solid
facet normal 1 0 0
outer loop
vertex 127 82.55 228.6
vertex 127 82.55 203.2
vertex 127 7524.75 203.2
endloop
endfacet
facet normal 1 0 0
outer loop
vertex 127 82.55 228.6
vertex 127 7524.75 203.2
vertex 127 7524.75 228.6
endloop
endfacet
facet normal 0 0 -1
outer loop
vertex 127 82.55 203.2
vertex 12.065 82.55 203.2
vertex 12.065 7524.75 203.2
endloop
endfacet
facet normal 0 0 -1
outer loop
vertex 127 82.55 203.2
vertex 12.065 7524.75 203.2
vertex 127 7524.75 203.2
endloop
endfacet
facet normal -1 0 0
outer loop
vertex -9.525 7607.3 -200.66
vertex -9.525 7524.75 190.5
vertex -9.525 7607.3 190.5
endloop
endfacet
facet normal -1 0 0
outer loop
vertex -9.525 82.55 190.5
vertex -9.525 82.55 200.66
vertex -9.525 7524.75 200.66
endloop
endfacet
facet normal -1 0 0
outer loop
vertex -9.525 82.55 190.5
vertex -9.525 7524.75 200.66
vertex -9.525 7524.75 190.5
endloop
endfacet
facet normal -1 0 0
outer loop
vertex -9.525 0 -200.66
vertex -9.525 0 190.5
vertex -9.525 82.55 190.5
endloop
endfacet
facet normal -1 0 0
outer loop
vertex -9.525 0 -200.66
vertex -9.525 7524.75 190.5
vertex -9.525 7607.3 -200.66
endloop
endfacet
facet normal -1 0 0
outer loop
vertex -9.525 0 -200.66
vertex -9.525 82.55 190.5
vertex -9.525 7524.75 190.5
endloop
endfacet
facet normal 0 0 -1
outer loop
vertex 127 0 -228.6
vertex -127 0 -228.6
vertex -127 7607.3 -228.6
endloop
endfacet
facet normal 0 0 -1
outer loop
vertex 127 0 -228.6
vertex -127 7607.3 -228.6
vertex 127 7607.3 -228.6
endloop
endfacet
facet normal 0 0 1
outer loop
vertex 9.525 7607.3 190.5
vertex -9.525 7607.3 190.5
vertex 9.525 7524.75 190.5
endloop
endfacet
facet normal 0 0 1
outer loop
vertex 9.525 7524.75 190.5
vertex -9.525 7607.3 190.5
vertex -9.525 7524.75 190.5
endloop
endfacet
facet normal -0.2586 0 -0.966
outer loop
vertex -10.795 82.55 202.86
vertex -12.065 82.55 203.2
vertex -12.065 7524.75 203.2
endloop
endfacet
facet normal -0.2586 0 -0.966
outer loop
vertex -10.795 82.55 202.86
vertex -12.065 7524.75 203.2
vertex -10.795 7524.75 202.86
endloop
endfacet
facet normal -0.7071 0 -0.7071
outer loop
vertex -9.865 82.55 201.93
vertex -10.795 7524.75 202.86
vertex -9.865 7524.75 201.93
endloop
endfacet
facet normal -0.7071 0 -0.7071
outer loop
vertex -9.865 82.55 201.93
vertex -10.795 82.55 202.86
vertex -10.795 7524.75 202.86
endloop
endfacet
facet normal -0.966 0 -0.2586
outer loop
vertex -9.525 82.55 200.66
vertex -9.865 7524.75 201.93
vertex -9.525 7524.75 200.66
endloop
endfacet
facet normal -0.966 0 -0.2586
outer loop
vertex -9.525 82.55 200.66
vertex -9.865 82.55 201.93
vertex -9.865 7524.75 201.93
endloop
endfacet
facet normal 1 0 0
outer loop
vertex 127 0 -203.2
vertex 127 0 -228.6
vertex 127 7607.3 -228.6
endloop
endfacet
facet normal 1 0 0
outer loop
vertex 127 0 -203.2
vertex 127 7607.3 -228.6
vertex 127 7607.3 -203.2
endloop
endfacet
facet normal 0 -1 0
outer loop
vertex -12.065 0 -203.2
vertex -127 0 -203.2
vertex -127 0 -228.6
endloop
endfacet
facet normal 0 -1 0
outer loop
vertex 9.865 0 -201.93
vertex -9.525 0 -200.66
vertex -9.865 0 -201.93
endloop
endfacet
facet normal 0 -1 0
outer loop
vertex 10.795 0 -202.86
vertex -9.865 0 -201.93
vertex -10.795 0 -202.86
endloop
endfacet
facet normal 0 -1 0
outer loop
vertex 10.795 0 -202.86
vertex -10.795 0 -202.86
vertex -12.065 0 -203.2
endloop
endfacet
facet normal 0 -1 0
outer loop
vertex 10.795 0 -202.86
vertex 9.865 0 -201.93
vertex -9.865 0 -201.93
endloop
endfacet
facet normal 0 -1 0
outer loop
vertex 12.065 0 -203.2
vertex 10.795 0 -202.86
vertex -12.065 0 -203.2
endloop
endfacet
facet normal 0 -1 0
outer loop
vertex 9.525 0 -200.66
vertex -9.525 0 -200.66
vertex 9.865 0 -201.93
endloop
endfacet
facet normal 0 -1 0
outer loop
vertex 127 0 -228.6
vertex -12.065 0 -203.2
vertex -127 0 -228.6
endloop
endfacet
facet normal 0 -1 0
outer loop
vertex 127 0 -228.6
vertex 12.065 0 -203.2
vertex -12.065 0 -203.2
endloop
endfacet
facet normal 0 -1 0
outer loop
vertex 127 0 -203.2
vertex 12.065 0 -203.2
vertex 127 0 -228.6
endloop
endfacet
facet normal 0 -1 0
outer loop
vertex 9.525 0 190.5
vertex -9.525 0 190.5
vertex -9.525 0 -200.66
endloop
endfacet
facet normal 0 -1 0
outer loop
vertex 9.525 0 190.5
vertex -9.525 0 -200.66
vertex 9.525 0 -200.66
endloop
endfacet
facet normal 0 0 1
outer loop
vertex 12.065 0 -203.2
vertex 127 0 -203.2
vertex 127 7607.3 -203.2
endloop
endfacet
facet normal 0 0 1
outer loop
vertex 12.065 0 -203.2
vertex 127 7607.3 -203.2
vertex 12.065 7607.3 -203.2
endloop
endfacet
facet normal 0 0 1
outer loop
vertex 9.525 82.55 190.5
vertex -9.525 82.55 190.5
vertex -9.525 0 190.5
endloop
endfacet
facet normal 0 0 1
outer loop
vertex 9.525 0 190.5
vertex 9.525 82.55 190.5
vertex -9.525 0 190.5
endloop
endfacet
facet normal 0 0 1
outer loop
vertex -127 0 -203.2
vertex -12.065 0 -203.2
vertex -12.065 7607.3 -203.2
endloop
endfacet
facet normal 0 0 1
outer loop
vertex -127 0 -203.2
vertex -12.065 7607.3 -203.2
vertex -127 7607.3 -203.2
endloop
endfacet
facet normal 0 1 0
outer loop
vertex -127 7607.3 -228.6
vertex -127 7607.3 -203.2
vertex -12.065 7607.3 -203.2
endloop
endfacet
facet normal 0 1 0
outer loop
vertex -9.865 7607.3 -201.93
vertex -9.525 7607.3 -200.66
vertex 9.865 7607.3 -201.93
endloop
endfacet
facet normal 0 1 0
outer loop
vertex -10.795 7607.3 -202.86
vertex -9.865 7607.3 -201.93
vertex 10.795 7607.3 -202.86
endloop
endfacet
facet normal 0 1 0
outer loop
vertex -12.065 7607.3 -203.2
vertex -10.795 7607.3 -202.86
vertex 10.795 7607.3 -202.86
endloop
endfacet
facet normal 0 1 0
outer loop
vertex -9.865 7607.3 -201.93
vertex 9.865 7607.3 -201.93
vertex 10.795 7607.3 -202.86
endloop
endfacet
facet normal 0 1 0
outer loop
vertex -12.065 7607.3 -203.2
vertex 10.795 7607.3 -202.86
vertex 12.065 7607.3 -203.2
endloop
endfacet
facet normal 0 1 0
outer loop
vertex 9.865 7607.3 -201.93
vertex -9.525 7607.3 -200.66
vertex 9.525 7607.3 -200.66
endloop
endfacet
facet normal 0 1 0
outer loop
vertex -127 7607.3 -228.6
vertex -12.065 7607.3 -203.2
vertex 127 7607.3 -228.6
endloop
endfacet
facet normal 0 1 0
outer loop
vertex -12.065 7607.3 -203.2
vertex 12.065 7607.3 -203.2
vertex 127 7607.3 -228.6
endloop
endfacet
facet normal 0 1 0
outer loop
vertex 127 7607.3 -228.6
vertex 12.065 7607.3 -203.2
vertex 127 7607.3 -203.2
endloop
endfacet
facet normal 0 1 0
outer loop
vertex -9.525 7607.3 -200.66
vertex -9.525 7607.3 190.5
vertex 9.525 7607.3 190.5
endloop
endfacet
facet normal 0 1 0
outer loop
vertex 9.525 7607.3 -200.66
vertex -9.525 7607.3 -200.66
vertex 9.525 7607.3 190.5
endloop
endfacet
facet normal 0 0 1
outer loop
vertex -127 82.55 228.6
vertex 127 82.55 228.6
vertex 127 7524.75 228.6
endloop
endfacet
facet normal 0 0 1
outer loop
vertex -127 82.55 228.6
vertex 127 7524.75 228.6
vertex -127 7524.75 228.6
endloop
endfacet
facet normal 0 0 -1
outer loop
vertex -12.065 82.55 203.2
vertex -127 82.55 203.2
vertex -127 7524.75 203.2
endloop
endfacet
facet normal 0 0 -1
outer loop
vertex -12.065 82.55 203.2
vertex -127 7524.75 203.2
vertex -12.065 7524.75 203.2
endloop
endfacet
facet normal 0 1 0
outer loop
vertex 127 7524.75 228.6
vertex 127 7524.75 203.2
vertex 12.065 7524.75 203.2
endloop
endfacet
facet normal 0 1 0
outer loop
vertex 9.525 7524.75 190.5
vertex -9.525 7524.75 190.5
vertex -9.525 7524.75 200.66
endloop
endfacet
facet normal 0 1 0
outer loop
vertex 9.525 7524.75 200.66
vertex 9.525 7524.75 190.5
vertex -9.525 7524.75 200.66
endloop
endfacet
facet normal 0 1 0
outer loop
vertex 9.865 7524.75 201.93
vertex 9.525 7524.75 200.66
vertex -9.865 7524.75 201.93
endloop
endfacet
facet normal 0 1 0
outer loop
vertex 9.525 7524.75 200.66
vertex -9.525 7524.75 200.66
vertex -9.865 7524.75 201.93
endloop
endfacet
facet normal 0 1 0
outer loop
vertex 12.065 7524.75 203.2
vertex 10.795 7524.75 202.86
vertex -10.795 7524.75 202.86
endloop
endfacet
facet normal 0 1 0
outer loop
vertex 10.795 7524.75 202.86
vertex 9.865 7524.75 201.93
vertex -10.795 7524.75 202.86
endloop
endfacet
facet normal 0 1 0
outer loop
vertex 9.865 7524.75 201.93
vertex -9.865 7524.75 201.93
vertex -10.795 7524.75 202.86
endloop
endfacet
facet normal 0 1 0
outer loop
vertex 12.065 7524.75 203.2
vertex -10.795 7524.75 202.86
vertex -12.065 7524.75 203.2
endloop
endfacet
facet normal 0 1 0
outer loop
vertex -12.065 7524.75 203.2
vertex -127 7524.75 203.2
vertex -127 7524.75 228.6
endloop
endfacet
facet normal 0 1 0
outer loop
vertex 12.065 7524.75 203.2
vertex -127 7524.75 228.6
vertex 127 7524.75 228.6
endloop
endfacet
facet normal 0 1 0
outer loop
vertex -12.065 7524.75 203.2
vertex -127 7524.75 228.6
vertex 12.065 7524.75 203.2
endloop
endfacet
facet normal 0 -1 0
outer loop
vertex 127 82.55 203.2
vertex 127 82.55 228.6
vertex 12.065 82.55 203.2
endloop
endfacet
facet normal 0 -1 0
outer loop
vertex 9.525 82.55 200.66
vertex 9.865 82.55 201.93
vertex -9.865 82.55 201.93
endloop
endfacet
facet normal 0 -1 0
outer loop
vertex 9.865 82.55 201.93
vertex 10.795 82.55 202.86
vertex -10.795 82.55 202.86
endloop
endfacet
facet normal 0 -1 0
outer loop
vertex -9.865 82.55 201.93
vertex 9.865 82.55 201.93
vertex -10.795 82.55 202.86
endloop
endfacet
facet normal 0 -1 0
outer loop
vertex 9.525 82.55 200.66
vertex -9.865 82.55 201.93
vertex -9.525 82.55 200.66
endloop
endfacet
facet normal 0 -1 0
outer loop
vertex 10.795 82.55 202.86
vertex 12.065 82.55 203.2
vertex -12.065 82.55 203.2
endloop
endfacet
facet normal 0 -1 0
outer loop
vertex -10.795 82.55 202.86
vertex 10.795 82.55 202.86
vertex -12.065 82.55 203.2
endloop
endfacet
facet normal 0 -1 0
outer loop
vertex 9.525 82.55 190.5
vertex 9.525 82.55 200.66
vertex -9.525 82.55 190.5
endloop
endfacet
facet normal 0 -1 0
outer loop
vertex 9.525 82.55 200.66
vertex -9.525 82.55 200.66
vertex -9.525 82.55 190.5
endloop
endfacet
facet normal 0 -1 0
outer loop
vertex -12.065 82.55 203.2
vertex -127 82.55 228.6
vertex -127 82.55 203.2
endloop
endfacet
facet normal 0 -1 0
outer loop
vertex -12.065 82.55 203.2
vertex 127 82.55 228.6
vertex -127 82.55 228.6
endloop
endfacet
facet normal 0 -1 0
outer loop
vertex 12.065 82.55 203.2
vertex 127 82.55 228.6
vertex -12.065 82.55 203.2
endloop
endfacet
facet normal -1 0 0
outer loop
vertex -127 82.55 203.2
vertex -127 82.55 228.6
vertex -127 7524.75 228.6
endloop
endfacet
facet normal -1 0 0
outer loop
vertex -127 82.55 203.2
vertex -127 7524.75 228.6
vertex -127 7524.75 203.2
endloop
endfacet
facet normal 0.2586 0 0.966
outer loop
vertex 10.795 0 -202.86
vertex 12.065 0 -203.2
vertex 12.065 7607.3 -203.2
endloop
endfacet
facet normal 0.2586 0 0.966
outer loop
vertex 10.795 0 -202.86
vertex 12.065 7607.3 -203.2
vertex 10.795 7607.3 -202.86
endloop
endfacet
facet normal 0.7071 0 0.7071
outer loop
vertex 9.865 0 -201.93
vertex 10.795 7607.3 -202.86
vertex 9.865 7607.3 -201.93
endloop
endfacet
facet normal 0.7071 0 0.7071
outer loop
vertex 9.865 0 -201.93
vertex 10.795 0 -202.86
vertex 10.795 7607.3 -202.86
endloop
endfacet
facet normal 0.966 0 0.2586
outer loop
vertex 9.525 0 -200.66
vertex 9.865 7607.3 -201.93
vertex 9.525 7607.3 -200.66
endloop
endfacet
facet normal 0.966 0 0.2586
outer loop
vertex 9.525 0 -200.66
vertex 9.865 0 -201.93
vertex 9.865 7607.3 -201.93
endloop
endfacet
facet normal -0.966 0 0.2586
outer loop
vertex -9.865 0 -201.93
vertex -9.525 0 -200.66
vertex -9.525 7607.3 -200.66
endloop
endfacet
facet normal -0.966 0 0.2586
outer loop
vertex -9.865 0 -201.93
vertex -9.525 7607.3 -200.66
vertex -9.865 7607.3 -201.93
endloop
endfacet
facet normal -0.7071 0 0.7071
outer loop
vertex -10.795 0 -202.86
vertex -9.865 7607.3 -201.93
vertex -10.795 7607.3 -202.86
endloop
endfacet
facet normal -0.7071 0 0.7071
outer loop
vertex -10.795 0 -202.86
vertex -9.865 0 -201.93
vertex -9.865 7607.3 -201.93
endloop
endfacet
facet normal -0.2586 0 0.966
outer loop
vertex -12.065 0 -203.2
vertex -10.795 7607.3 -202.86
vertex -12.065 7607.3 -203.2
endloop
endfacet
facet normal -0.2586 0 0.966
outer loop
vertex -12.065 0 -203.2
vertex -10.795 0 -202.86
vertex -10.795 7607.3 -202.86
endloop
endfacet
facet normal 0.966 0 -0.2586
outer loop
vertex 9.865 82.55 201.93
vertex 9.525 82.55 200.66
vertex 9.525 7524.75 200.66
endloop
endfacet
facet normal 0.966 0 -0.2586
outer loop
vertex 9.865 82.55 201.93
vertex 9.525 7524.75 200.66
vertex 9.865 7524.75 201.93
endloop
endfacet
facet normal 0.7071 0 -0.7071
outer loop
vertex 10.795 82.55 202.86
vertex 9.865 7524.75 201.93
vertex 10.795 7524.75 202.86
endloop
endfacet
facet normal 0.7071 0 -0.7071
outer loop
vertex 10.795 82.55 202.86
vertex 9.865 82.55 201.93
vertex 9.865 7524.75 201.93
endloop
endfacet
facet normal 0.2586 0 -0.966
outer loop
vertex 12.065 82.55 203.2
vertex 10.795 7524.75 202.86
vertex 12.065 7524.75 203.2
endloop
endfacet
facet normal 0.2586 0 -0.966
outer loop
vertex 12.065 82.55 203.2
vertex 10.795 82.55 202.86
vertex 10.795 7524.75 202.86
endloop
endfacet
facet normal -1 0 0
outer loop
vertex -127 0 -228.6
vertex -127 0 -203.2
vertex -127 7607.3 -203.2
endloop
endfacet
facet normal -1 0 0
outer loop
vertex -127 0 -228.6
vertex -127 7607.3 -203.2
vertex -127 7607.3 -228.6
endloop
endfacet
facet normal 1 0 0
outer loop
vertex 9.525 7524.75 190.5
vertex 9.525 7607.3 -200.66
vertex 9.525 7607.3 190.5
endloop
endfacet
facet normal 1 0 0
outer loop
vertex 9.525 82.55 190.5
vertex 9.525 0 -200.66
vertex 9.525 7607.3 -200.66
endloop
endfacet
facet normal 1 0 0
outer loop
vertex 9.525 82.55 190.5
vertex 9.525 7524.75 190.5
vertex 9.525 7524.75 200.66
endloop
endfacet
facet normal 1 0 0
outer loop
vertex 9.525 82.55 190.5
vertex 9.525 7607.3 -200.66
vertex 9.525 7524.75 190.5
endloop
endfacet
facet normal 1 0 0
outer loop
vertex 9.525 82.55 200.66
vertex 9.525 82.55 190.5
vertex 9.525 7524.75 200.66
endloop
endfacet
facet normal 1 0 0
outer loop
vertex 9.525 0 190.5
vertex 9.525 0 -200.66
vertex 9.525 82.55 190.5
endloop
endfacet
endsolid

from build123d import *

# Parameters (mm, degrees)
F1_DEPTH = 7607.3
F2_W     = 82.55
F2_H     = 25.4
F2_H_2   = 12.7
F3_DEPTH = 254.001
F4_W     = 82.55
F4_H     = 25.4
F4_H_2   = 12.7
F5_DEPTH = 254.001


with BuildPart() as f1:
    # F0 (on Front) → F1 (new body)
    with BuildSketch(Plane.XZ):
        with BuildLine():
            Line((127, -228.6), (127, -203.2))
            Line((127, -203.2), (12.065, -203.2))
            ThreePointArc((12.065, -203.2), (10.268949, -202.456051), (9.525, -200.66))
            Line((9.525, -200.66), (9.525, 200.66))
            ThreePointArc((9.525, 200.66), (10.268949, 202.456051), (12.065, 203.2))
            Line((12.065, 203.2), (127, 203.2))
            Line((127, 203.2), (127, 228.6))
            Line((127, 228.6), (-127, 228.6))
            Line((-127, 228.6), (-127, 203.2))
            Line((-127, 203.2), (-12.065, 203.2))
            ThreePointArc((-12.065, 203.2), (-10.268949, 202.456051), (-9.525, 200.66))
            Line((-9.525, 200.66), (-9.525, -200.66))
            ThreePointArc((-9.525, -200.66), (-10.268949, -202.456051), (-12.065, -203.2))
            Line((-12.065, -203.2), (-127, -203.2))
            Line((-127, -203.2), (-127, -228.6))
            Line((-127, -228.6), (127, -228.6))
        make_face()
    extrude(amount=-F1_DEPTH)

    # F2 (on face) → F3 (cut, through all)
    with BuildSketch(Plane(origin=(-127, 0, 0), x_dir=(0, -1, 0), z_dir=(-1, 0, 0))):
        with Locations((-7566.025, 215.9)):
            Rectangle(F2_W, F2_H)
        with Locations((-7566.025, 196.85)):
            Rectangle(F2_W, F2_H_2)
    extrude(amount=-F3_DEPTH, mode=Mode.SUBTRACT)

    # F4 (on face) → F5 (cut, through all)
    with BuildSketch(Plane(origin=(-127, 0, 0), x_dir=(0, -1, 0), z_dir=(-1, 0, 0))):
        with Locations((-41.275, 215.9)):
            Rectangle(F4_W, F4_H)
        with Locations((-41.275, 196.85)):
            Rectangle(F4_W, F4_H_2)
    extrude(amount=-F5_DEPTH, mode=Mode.SUBTRACT)


solid = f1.part
